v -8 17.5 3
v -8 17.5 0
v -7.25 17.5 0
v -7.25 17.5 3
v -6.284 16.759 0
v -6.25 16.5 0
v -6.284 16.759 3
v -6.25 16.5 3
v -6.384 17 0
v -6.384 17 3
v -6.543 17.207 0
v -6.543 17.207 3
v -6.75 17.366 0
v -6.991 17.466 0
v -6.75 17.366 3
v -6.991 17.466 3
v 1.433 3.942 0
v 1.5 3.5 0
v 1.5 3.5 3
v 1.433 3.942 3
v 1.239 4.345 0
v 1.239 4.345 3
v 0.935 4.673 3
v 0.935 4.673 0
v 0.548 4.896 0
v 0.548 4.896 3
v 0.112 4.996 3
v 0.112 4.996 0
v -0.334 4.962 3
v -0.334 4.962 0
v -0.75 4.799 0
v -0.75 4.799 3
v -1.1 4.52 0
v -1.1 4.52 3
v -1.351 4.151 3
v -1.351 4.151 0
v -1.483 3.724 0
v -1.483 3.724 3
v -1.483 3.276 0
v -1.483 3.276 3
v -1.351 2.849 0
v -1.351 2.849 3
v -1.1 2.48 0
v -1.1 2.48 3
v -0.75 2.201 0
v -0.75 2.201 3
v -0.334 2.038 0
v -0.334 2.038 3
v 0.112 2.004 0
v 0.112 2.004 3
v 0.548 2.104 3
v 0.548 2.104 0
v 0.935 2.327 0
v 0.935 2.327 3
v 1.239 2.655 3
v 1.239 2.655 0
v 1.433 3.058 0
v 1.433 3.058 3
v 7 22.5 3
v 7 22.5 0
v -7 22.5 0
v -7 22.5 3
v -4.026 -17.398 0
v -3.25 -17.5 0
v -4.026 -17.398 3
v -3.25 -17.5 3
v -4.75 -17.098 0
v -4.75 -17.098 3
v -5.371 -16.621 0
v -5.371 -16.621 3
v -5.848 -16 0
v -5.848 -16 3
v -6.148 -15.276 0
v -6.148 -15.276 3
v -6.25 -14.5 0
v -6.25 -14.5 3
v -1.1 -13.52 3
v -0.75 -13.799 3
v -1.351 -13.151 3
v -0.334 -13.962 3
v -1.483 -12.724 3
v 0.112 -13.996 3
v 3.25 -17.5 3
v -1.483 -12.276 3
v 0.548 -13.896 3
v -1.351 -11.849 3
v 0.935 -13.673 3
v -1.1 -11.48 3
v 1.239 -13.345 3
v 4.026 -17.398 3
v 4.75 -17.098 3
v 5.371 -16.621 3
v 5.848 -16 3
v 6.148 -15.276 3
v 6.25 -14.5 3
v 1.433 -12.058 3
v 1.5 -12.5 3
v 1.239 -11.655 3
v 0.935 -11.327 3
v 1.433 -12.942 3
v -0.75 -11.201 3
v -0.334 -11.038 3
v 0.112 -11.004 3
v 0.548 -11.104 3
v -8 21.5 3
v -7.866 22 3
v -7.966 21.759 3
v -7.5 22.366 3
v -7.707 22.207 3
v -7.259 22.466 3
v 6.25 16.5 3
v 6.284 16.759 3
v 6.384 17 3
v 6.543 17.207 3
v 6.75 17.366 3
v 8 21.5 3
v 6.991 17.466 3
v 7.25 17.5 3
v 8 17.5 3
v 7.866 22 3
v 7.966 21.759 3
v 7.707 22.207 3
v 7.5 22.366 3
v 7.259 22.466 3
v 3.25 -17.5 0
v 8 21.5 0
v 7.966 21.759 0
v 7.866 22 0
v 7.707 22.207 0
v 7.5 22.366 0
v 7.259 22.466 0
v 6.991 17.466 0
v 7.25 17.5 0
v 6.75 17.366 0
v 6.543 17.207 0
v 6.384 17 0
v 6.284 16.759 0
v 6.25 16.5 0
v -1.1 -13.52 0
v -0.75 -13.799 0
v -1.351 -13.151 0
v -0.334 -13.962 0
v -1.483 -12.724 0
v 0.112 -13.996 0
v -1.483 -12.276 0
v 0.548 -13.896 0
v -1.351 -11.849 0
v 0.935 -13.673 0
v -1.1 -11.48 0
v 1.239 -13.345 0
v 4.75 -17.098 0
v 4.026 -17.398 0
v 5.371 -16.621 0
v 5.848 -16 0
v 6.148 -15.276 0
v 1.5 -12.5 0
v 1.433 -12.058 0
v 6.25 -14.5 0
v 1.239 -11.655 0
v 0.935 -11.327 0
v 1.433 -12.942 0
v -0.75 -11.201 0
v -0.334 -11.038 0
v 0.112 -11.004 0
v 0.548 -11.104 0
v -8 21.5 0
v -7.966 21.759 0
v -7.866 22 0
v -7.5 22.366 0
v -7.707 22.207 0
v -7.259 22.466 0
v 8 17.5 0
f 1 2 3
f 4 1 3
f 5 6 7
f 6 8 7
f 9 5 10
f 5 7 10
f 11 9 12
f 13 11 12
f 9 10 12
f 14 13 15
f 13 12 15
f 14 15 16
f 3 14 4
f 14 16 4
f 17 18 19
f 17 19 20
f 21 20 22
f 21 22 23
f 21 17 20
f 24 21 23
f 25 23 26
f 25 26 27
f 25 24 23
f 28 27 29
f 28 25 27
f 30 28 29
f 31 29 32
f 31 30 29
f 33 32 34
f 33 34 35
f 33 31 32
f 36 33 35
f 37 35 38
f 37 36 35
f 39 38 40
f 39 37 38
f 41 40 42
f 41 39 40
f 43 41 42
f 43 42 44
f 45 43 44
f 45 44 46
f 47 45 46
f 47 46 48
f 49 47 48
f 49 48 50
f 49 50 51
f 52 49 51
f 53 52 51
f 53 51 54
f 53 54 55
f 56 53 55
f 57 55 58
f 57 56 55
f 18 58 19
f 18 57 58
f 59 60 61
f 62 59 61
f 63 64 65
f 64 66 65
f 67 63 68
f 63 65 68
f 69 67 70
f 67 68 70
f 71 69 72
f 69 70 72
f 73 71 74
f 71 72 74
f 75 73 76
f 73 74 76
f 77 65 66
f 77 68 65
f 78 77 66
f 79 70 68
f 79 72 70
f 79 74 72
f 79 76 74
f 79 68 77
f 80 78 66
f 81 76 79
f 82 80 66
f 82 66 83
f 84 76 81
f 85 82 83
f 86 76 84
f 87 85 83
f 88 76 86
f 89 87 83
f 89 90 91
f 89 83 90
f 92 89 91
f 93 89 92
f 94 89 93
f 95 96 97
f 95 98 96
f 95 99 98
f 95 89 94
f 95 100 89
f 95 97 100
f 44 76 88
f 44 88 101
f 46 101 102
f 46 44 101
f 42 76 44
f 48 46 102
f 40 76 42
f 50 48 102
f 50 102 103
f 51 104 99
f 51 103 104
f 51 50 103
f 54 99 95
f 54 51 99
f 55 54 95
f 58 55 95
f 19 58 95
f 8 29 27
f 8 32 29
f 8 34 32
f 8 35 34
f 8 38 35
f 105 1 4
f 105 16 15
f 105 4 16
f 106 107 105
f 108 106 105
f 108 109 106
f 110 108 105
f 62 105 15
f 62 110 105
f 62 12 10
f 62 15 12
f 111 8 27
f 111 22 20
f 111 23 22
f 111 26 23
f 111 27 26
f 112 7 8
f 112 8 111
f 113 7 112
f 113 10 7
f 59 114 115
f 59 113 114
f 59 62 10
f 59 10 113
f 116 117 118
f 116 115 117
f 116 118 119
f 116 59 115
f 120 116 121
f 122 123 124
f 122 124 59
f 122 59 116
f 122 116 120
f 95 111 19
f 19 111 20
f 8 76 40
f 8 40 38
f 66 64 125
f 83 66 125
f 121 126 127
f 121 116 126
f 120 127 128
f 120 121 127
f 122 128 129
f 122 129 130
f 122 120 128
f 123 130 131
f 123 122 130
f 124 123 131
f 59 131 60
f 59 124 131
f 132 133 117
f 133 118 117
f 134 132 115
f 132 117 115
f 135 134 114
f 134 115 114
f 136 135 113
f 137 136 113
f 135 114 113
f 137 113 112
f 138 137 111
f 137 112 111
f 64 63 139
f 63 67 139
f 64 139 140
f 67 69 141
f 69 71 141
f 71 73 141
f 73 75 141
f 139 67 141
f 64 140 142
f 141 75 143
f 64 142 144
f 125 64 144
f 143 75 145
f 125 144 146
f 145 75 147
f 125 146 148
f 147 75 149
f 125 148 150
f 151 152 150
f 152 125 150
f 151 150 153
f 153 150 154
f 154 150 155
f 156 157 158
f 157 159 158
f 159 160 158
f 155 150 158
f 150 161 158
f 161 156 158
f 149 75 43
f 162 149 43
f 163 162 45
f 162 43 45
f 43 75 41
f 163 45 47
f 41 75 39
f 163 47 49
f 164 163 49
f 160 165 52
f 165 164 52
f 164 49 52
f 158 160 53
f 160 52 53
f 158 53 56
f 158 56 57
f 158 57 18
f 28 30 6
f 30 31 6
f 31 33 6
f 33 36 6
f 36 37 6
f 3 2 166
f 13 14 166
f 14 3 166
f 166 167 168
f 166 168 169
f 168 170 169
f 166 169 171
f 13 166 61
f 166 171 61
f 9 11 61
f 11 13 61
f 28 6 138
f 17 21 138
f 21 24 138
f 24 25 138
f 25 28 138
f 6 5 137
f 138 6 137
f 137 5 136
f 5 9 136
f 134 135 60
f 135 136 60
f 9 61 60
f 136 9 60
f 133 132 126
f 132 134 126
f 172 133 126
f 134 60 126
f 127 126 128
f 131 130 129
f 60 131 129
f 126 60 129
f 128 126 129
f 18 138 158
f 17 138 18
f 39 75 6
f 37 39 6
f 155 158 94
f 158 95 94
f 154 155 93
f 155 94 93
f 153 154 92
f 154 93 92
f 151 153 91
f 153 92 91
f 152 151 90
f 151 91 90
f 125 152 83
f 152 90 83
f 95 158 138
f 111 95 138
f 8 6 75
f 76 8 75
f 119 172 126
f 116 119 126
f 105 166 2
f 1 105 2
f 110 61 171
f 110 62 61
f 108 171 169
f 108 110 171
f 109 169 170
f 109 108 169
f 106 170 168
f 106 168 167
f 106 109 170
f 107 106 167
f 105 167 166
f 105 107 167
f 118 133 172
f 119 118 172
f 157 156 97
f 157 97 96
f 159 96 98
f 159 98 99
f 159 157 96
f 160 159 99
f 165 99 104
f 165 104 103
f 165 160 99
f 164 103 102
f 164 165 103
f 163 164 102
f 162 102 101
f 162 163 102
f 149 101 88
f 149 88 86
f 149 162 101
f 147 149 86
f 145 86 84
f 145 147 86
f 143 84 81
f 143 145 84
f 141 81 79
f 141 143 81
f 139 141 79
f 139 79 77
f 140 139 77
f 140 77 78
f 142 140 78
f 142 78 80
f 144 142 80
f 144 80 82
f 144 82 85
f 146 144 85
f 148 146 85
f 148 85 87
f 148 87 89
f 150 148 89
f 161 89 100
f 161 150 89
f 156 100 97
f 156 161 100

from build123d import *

# Parameters (mm, degrees)
SKETCH1_R           = 1.5
BOSS_EXTRUDE1_DEPTH = 3
FILLET1_R           = 1
FILLET2_R           = 3


with BuildPart() as part:
    # Sketch1 → Boss-Extrude1 (new body)
    with BuildSketch(Plane.XY):
        Polygon((6.25, 17.5), (8, 17.5), (8, 22.5), (-8, 22.5), (-8, 17.5), (-6.25, 17.5), (-6.25, -17.5), (6.25, -17.5), align=None)
        with Locations((0, 3.5)):
            Circle(SKETCH1_R, mode=Mode.SUBTRACT)
        with Locations((0, -12.5)):
            Circle(SKETCH1_R, mode=Mode.SUBTRACT)
    extrude(amount=BOSS_EXTRUDE1_DEPTH)

    # Fillet1
    fillet1_edges = [part.edges().sort_by_distance(p)[0] for p in [
        (6.25, 17.5, 1.5),
        (-6.25, 17.5, 1.5),
        (-8, 22.5, 1.5),
        (8, 22.5, 1.5),
    ]]
    fillet(fillet1_edges, radius=FILLET1_R)

    # Fillet2
    fillet2_edges = [part.edges().sort_by_distance(p)[0] for p in [
        (6.25, -17.5, 1.5),
        (-6.25, -17.5, 1.5),
    ]]
    fillet(fillet2_edges, radius=FILLET2_R)


solid = part.part
